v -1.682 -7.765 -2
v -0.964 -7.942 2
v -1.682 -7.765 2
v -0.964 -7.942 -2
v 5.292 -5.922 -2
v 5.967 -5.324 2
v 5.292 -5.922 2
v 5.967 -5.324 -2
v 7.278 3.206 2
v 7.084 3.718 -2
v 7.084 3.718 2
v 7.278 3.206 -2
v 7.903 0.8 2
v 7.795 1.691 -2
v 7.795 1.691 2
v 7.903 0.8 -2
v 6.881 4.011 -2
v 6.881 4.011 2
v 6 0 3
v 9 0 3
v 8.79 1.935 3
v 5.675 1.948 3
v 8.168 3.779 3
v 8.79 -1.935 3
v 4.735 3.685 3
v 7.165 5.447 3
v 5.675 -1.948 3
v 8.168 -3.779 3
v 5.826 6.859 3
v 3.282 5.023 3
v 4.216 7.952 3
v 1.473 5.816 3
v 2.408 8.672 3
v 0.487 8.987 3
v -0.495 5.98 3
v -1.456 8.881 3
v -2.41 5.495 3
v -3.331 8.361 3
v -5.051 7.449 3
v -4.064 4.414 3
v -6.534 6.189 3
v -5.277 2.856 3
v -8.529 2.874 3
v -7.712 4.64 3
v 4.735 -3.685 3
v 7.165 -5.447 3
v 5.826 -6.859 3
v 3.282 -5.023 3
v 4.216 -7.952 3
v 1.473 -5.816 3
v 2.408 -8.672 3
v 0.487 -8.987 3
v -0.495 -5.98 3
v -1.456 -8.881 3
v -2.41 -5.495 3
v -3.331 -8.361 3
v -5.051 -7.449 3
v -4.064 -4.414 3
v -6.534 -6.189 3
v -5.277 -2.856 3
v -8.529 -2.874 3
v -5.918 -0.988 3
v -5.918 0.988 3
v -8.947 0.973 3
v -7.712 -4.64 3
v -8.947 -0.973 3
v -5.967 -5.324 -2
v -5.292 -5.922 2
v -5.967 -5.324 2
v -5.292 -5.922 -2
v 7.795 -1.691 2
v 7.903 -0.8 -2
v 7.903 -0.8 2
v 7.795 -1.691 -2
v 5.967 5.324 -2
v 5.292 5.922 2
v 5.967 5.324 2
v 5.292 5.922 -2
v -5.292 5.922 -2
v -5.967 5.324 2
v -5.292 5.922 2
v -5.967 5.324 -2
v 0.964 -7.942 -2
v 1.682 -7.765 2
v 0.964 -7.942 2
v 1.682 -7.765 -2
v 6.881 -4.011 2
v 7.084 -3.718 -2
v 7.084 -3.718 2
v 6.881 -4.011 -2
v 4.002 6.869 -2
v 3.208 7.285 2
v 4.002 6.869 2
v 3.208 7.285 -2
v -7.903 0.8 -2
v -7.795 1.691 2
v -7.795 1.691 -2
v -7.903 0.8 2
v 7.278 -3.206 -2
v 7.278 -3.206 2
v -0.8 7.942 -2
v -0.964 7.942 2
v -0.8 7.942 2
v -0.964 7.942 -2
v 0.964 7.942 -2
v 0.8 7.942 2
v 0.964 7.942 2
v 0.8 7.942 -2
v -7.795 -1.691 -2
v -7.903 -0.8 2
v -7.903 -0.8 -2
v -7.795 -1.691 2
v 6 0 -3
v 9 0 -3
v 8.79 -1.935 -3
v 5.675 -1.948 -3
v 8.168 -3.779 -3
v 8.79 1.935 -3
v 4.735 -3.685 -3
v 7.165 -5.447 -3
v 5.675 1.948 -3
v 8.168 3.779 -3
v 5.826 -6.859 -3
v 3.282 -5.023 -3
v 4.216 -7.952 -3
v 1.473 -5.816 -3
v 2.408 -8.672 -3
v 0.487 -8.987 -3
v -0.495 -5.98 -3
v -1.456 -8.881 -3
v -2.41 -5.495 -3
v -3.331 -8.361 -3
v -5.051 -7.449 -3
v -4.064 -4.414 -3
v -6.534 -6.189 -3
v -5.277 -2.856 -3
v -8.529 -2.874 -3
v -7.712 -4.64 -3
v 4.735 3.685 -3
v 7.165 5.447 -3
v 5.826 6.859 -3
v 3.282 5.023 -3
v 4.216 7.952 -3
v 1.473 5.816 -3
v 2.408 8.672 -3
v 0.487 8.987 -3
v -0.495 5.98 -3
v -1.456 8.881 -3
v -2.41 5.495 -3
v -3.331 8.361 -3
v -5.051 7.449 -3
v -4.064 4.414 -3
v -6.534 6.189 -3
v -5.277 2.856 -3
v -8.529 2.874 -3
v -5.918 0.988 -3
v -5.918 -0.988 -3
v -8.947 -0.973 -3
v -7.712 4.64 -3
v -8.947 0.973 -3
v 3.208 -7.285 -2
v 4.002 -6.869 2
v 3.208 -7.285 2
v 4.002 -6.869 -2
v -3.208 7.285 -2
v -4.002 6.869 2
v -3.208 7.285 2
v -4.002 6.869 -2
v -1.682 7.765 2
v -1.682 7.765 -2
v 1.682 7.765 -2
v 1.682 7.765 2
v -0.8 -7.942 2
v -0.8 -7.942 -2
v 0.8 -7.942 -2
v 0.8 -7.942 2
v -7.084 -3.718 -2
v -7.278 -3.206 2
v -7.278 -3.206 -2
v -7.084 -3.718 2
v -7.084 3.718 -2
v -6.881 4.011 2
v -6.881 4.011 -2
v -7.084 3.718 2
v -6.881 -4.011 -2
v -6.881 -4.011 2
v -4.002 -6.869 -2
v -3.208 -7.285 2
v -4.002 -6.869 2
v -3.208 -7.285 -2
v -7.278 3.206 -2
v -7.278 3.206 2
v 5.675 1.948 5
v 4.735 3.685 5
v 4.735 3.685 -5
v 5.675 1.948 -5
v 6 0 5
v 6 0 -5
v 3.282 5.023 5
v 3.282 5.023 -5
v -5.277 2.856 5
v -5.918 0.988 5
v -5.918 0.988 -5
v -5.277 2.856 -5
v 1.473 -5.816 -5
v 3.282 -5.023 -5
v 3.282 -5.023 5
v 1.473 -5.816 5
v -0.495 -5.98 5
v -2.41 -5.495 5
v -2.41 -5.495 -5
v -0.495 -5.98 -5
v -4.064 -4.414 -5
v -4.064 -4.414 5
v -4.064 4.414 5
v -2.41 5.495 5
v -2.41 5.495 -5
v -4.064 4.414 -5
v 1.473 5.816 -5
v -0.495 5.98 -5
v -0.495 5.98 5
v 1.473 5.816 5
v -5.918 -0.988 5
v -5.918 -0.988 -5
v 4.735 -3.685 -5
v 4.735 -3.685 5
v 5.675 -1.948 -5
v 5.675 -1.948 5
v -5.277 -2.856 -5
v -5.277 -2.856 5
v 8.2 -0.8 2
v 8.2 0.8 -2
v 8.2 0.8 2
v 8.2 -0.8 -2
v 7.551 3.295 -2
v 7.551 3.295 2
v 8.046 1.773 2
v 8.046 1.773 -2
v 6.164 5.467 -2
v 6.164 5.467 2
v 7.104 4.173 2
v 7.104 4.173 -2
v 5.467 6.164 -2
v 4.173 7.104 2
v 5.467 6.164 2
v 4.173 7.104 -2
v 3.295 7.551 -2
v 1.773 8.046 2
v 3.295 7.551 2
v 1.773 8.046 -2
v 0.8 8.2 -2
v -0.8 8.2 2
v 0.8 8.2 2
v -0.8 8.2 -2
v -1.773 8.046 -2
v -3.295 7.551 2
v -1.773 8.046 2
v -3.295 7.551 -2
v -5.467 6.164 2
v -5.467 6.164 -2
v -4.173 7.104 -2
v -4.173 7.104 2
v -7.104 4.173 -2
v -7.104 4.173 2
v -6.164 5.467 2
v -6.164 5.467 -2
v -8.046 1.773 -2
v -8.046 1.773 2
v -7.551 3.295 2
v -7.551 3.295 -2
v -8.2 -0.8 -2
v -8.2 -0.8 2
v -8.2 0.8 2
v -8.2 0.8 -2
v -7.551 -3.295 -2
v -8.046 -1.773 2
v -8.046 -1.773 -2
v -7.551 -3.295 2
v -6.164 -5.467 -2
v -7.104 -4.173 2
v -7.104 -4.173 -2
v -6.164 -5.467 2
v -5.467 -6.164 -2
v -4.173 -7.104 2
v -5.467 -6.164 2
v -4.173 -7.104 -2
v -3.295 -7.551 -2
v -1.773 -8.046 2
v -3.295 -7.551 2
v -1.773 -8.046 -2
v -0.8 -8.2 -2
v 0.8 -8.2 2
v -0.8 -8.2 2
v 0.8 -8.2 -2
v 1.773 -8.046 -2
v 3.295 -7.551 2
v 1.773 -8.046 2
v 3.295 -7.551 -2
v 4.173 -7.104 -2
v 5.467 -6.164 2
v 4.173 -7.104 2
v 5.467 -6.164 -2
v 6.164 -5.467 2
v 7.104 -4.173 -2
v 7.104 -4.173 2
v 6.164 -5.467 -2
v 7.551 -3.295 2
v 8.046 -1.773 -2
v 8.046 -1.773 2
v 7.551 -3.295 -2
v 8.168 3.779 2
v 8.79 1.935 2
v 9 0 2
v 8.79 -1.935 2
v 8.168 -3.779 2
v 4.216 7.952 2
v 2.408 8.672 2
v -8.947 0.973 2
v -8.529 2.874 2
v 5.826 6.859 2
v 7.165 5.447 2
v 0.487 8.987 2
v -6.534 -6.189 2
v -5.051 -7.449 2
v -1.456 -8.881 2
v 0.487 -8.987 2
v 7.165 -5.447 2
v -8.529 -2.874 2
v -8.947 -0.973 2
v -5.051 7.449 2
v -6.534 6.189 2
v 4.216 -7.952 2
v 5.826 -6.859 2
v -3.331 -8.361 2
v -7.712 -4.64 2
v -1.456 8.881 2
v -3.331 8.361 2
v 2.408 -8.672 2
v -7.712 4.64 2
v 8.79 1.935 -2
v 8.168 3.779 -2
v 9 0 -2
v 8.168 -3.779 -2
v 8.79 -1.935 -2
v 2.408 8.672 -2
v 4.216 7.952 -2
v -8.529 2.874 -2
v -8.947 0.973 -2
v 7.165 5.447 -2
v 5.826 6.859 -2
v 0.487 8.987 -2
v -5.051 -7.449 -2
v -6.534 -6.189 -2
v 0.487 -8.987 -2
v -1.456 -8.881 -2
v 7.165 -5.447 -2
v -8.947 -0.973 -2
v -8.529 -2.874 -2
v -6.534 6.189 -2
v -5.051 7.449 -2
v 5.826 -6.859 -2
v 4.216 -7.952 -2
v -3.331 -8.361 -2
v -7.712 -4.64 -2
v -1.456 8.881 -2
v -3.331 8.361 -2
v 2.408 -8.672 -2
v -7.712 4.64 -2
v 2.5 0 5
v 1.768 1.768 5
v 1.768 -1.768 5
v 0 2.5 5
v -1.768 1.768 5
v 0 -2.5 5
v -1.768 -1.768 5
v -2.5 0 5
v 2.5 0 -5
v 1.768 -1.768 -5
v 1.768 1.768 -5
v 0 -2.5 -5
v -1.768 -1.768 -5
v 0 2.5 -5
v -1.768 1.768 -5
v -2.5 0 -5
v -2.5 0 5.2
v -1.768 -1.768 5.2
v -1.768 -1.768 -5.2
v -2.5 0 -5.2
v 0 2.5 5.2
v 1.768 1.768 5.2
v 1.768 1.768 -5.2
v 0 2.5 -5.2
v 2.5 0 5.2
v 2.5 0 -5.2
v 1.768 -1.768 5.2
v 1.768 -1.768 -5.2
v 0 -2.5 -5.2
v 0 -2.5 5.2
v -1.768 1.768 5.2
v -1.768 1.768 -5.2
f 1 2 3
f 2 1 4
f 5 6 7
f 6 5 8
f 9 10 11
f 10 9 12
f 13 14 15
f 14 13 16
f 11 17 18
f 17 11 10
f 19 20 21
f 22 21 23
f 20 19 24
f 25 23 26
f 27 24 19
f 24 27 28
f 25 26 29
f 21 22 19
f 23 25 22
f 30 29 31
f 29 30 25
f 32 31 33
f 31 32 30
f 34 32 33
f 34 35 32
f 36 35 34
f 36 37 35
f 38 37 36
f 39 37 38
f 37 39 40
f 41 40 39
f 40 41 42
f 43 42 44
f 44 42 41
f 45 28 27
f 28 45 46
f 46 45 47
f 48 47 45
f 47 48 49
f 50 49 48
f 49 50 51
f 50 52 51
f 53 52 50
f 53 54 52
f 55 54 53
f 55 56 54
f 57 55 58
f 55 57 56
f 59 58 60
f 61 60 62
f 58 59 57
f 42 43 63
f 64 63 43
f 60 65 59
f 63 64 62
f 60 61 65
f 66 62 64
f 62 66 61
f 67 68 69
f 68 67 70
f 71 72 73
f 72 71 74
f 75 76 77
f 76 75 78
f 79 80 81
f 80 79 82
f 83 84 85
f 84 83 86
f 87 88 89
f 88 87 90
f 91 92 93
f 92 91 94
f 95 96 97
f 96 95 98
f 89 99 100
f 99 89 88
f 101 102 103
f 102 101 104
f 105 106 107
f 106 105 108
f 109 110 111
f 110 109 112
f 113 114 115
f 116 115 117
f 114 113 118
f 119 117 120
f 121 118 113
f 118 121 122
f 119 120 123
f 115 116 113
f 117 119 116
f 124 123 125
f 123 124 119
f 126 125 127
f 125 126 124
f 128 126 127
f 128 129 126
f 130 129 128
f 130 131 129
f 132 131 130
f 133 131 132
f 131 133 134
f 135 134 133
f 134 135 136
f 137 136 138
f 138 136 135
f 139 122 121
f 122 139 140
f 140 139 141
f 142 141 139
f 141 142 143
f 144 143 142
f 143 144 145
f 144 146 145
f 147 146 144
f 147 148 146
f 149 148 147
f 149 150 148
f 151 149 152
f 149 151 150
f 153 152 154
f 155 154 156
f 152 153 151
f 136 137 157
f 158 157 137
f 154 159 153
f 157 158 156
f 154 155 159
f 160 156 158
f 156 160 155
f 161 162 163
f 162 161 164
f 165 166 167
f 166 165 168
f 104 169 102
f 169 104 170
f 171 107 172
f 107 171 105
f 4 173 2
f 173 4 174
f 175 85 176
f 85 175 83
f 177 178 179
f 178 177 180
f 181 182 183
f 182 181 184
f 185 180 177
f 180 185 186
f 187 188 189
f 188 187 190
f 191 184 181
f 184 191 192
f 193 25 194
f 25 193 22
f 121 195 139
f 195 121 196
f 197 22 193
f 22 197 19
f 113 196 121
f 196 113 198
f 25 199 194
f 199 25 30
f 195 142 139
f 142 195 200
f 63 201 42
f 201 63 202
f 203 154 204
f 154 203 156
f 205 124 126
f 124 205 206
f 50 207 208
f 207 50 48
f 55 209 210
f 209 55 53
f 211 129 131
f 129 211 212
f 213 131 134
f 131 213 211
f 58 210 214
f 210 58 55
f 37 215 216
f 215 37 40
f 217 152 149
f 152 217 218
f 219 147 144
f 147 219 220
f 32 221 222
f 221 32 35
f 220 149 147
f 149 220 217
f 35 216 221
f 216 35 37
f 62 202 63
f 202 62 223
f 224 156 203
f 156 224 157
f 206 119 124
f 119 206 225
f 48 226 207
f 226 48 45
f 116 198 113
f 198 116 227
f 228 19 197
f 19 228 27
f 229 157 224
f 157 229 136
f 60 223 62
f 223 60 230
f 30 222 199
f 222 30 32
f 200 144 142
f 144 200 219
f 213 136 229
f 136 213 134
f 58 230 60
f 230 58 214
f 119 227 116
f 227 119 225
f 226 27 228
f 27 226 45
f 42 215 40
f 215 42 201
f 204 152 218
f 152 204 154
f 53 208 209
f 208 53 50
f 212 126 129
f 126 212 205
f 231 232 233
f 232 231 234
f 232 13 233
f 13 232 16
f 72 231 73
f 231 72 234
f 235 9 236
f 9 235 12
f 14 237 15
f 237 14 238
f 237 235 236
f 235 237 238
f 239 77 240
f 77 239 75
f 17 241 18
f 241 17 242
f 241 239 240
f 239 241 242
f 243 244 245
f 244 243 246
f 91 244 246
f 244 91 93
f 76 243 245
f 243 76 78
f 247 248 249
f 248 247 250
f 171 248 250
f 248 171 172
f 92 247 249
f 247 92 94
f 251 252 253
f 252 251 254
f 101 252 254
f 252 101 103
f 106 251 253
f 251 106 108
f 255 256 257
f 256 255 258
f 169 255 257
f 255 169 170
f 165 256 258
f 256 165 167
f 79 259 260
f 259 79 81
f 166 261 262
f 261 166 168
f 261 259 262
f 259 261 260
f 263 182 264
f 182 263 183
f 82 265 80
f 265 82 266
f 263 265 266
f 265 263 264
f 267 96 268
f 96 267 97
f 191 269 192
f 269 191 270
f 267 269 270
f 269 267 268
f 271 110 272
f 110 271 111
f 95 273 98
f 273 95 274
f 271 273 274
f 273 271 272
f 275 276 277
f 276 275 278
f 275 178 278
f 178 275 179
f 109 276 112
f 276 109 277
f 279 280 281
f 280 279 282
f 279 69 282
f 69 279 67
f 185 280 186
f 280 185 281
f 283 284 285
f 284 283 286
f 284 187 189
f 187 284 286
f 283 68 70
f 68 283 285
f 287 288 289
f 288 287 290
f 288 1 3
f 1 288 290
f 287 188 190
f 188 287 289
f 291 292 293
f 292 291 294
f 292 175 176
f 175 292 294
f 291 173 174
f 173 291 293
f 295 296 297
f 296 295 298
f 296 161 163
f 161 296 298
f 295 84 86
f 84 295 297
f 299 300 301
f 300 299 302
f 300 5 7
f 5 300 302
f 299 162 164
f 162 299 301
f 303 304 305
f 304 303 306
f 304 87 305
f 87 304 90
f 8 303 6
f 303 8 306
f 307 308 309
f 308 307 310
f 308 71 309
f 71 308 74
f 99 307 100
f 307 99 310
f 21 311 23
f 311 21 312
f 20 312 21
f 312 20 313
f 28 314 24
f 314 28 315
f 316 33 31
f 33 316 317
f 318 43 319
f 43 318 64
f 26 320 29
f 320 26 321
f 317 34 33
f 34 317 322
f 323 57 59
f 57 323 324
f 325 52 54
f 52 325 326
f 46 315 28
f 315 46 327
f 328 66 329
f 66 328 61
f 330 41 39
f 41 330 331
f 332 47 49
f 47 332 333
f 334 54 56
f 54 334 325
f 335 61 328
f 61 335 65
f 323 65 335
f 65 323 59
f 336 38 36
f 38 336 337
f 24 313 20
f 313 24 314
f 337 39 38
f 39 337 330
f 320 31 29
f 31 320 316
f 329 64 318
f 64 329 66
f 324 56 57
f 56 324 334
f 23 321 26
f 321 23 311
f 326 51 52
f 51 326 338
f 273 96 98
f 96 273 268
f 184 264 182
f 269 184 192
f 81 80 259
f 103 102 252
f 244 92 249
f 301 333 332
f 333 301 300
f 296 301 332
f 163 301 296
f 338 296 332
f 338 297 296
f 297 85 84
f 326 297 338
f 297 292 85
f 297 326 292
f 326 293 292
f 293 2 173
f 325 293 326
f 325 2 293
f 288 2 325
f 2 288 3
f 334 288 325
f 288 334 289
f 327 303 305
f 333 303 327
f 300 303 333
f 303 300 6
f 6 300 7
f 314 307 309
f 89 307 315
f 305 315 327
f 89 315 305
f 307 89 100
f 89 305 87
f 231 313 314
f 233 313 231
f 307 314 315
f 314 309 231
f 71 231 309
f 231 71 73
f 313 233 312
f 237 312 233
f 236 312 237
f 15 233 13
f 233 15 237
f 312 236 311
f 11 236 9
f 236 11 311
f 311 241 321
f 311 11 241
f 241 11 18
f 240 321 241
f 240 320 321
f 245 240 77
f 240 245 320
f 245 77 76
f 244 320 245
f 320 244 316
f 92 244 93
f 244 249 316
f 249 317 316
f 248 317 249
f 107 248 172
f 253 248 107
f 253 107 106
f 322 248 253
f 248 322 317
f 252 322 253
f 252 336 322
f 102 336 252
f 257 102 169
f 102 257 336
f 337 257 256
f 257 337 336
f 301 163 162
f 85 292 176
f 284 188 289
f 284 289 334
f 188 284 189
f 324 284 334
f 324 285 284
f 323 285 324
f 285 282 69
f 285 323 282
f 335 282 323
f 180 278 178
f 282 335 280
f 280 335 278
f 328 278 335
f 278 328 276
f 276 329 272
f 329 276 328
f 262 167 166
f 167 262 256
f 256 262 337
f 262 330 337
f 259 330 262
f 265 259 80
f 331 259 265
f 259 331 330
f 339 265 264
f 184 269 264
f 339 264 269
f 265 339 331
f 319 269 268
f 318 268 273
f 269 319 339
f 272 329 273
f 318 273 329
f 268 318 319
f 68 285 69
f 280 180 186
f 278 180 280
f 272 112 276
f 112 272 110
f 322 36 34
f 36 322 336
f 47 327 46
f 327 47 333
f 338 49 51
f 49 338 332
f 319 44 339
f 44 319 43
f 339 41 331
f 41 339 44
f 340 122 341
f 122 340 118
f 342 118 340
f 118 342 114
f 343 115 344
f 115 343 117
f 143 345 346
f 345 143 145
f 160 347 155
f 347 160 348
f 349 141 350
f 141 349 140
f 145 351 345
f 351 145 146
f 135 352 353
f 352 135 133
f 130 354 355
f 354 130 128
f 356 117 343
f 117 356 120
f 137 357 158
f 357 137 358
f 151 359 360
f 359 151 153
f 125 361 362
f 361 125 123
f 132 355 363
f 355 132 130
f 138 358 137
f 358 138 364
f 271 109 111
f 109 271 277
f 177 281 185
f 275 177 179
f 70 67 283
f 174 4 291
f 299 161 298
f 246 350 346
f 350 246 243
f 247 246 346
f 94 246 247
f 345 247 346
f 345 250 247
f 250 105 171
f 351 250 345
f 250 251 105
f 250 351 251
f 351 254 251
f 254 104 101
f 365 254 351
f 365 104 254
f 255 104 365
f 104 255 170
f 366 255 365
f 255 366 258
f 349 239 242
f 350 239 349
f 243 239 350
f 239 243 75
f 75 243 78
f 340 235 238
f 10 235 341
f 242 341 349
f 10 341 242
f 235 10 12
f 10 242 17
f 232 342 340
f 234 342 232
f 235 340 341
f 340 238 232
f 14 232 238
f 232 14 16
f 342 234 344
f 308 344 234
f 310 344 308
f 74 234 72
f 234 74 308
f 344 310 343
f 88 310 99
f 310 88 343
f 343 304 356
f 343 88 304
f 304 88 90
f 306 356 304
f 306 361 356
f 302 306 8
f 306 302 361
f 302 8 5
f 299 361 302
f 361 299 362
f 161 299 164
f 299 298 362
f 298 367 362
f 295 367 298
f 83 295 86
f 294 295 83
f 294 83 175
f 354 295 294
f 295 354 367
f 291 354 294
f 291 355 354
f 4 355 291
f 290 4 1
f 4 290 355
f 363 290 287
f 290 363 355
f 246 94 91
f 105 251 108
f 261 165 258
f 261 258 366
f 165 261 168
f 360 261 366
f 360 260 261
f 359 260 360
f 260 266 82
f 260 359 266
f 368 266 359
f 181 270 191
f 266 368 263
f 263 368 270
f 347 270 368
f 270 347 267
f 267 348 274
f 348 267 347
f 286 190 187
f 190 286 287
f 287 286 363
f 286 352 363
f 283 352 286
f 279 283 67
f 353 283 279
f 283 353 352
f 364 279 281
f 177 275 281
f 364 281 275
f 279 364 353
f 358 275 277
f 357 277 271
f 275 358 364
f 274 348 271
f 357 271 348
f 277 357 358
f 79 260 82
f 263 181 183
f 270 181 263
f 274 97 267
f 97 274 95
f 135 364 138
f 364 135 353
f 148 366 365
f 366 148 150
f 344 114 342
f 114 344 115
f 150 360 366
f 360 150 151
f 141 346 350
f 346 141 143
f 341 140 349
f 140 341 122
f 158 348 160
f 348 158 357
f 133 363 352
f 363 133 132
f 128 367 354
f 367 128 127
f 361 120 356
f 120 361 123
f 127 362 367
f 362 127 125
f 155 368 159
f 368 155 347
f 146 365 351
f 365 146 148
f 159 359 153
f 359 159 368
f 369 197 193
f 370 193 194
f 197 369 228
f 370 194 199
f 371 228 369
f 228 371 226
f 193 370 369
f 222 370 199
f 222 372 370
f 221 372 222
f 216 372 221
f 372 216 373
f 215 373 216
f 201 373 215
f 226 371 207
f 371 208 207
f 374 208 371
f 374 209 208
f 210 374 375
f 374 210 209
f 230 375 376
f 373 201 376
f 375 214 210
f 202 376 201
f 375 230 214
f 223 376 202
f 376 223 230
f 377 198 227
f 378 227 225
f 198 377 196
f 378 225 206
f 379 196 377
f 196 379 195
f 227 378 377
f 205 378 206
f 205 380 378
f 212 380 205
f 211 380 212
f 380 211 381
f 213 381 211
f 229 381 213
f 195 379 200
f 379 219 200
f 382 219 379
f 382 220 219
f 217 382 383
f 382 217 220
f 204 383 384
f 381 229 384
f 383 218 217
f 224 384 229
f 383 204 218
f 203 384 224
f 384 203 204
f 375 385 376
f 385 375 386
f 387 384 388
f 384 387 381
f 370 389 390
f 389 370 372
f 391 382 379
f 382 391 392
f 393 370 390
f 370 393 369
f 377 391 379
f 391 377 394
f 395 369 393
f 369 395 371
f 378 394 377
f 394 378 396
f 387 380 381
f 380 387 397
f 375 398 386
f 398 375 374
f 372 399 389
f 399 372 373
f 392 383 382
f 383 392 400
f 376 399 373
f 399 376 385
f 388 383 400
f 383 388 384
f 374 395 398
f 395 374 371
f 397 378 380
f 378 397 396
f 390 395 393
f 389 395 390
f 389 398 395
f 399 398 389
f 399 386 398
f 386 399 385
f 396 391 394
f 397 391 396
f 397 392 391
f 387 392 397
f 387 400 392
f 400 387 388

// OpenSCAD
// Parameters
pulley_type_timing = 1; //[0:1:1]
tooth_count = 20; //[10:60:1]
outer_diameter_mm = 16; //[8:32:0.5]
belt_width_mm = 6; //[3:20:0.5]
bore_diameter_mm = 5; //[2:12:0.5]
hub_diameter_mm = 12; //[6:24:0.5]
hub_length_mm = 10; //[5:25:0.5]
flange_diameter_mm = 18; //[10:40:0.5]
flange_thickness_mm = 1; //[0.5:3:0.25]
flanges_enabled = 1; //[0:1:1]
set_screw_count = 0; //[0:4:1]
set_screw_hole_diameter_mm = 3; //[2:6:0.25]
set_screw_z_offset_mm = 5; //[0:20:0.5]
tooth_radial_height_mm = 1.2; //[0.6:2.5:0.1]
tooth_tangential_width_mm = 1.6; //[0.8:3.0:0.1]
tooth_axial_width_mm = 6; //[3:20:0.5]
rim_wall_radial_thickness_mm = 2; //[1:5:0.25]
overlap_mm = 1; //[0.5:2:0.1]
eps_mm = 0.2; //[0.05:0.5:0.05]

// Pulley module
module pulley() {
  color("Silver") {
    // Hub
    translate([0, 0, 0])
      cylinder(r=hub_diameter_mm/2, h=hub_length_mm, center=true);

    // Outer Rim
    difference() {
      translate([0, 0, 0])
        cylinder(r=outer_diameter_mm/2, h=belt_width_mm, center=true);
      translate([0, 0, 0])
        cylinder(r=outer_diameter_mm/2 - rim_wall_radial_thickness_mm, h=belt_width_mm + 2*eps_mm, center=true);
    }

    // Teeth or Smooth Crown
    if (pulley_type_timing == 1) {
      for (i = [0:tooth_count-1]) {
        rotate([0, 0, i*360/tooth_count])
          translate([outer_diameter_mm/2 - overlap_mm + tooth_radial_height_mm/2, 0, 0])
            cube([tooth_radial_height_mm, tooth_tangential_width_mm, tooth_axial_width_mm], center=true);
      }
    }

    // Flanges
    if (flanges_enabled == 1) {
      translate([0, 0, belt_width_mm/2 + flange_thickness_mm/2 - overlap_mm])
        cylinder(r=flange_diameter_mm/2, h=flange_thickness_mm, center=true);
      translate([0, 0, -belt_width_mm/2 - flange_thickness_mm/2 + overlap_mm])
        cylinder(r=flange_diameter_mm/2, h=flange_thickness_mm, center=true);
    }

    // Bore
    translate([0, 0, 0])
      cylinder(r=bore_diameter_mm/2, h=hub_length_mm + 2*eps_mm, center=true);

    // Set Screw Holes
    if (set_screw_count > 0) {
      for (i = [0:set_screw_count-1]) {
        rotate([0, 90, i*360/set_screw_count])
          translate([0, 0, -hub_length_mm/2 + set_screw_z_offset_mm])
            cylinder(r=set_screw_hole_diameter_mm/2, h=hub_diameter_mm + 2*eps_mm, center=true);
      }
    }
  }
}

// Assembly
module assembly() {
  pulley();
}

assembly();
